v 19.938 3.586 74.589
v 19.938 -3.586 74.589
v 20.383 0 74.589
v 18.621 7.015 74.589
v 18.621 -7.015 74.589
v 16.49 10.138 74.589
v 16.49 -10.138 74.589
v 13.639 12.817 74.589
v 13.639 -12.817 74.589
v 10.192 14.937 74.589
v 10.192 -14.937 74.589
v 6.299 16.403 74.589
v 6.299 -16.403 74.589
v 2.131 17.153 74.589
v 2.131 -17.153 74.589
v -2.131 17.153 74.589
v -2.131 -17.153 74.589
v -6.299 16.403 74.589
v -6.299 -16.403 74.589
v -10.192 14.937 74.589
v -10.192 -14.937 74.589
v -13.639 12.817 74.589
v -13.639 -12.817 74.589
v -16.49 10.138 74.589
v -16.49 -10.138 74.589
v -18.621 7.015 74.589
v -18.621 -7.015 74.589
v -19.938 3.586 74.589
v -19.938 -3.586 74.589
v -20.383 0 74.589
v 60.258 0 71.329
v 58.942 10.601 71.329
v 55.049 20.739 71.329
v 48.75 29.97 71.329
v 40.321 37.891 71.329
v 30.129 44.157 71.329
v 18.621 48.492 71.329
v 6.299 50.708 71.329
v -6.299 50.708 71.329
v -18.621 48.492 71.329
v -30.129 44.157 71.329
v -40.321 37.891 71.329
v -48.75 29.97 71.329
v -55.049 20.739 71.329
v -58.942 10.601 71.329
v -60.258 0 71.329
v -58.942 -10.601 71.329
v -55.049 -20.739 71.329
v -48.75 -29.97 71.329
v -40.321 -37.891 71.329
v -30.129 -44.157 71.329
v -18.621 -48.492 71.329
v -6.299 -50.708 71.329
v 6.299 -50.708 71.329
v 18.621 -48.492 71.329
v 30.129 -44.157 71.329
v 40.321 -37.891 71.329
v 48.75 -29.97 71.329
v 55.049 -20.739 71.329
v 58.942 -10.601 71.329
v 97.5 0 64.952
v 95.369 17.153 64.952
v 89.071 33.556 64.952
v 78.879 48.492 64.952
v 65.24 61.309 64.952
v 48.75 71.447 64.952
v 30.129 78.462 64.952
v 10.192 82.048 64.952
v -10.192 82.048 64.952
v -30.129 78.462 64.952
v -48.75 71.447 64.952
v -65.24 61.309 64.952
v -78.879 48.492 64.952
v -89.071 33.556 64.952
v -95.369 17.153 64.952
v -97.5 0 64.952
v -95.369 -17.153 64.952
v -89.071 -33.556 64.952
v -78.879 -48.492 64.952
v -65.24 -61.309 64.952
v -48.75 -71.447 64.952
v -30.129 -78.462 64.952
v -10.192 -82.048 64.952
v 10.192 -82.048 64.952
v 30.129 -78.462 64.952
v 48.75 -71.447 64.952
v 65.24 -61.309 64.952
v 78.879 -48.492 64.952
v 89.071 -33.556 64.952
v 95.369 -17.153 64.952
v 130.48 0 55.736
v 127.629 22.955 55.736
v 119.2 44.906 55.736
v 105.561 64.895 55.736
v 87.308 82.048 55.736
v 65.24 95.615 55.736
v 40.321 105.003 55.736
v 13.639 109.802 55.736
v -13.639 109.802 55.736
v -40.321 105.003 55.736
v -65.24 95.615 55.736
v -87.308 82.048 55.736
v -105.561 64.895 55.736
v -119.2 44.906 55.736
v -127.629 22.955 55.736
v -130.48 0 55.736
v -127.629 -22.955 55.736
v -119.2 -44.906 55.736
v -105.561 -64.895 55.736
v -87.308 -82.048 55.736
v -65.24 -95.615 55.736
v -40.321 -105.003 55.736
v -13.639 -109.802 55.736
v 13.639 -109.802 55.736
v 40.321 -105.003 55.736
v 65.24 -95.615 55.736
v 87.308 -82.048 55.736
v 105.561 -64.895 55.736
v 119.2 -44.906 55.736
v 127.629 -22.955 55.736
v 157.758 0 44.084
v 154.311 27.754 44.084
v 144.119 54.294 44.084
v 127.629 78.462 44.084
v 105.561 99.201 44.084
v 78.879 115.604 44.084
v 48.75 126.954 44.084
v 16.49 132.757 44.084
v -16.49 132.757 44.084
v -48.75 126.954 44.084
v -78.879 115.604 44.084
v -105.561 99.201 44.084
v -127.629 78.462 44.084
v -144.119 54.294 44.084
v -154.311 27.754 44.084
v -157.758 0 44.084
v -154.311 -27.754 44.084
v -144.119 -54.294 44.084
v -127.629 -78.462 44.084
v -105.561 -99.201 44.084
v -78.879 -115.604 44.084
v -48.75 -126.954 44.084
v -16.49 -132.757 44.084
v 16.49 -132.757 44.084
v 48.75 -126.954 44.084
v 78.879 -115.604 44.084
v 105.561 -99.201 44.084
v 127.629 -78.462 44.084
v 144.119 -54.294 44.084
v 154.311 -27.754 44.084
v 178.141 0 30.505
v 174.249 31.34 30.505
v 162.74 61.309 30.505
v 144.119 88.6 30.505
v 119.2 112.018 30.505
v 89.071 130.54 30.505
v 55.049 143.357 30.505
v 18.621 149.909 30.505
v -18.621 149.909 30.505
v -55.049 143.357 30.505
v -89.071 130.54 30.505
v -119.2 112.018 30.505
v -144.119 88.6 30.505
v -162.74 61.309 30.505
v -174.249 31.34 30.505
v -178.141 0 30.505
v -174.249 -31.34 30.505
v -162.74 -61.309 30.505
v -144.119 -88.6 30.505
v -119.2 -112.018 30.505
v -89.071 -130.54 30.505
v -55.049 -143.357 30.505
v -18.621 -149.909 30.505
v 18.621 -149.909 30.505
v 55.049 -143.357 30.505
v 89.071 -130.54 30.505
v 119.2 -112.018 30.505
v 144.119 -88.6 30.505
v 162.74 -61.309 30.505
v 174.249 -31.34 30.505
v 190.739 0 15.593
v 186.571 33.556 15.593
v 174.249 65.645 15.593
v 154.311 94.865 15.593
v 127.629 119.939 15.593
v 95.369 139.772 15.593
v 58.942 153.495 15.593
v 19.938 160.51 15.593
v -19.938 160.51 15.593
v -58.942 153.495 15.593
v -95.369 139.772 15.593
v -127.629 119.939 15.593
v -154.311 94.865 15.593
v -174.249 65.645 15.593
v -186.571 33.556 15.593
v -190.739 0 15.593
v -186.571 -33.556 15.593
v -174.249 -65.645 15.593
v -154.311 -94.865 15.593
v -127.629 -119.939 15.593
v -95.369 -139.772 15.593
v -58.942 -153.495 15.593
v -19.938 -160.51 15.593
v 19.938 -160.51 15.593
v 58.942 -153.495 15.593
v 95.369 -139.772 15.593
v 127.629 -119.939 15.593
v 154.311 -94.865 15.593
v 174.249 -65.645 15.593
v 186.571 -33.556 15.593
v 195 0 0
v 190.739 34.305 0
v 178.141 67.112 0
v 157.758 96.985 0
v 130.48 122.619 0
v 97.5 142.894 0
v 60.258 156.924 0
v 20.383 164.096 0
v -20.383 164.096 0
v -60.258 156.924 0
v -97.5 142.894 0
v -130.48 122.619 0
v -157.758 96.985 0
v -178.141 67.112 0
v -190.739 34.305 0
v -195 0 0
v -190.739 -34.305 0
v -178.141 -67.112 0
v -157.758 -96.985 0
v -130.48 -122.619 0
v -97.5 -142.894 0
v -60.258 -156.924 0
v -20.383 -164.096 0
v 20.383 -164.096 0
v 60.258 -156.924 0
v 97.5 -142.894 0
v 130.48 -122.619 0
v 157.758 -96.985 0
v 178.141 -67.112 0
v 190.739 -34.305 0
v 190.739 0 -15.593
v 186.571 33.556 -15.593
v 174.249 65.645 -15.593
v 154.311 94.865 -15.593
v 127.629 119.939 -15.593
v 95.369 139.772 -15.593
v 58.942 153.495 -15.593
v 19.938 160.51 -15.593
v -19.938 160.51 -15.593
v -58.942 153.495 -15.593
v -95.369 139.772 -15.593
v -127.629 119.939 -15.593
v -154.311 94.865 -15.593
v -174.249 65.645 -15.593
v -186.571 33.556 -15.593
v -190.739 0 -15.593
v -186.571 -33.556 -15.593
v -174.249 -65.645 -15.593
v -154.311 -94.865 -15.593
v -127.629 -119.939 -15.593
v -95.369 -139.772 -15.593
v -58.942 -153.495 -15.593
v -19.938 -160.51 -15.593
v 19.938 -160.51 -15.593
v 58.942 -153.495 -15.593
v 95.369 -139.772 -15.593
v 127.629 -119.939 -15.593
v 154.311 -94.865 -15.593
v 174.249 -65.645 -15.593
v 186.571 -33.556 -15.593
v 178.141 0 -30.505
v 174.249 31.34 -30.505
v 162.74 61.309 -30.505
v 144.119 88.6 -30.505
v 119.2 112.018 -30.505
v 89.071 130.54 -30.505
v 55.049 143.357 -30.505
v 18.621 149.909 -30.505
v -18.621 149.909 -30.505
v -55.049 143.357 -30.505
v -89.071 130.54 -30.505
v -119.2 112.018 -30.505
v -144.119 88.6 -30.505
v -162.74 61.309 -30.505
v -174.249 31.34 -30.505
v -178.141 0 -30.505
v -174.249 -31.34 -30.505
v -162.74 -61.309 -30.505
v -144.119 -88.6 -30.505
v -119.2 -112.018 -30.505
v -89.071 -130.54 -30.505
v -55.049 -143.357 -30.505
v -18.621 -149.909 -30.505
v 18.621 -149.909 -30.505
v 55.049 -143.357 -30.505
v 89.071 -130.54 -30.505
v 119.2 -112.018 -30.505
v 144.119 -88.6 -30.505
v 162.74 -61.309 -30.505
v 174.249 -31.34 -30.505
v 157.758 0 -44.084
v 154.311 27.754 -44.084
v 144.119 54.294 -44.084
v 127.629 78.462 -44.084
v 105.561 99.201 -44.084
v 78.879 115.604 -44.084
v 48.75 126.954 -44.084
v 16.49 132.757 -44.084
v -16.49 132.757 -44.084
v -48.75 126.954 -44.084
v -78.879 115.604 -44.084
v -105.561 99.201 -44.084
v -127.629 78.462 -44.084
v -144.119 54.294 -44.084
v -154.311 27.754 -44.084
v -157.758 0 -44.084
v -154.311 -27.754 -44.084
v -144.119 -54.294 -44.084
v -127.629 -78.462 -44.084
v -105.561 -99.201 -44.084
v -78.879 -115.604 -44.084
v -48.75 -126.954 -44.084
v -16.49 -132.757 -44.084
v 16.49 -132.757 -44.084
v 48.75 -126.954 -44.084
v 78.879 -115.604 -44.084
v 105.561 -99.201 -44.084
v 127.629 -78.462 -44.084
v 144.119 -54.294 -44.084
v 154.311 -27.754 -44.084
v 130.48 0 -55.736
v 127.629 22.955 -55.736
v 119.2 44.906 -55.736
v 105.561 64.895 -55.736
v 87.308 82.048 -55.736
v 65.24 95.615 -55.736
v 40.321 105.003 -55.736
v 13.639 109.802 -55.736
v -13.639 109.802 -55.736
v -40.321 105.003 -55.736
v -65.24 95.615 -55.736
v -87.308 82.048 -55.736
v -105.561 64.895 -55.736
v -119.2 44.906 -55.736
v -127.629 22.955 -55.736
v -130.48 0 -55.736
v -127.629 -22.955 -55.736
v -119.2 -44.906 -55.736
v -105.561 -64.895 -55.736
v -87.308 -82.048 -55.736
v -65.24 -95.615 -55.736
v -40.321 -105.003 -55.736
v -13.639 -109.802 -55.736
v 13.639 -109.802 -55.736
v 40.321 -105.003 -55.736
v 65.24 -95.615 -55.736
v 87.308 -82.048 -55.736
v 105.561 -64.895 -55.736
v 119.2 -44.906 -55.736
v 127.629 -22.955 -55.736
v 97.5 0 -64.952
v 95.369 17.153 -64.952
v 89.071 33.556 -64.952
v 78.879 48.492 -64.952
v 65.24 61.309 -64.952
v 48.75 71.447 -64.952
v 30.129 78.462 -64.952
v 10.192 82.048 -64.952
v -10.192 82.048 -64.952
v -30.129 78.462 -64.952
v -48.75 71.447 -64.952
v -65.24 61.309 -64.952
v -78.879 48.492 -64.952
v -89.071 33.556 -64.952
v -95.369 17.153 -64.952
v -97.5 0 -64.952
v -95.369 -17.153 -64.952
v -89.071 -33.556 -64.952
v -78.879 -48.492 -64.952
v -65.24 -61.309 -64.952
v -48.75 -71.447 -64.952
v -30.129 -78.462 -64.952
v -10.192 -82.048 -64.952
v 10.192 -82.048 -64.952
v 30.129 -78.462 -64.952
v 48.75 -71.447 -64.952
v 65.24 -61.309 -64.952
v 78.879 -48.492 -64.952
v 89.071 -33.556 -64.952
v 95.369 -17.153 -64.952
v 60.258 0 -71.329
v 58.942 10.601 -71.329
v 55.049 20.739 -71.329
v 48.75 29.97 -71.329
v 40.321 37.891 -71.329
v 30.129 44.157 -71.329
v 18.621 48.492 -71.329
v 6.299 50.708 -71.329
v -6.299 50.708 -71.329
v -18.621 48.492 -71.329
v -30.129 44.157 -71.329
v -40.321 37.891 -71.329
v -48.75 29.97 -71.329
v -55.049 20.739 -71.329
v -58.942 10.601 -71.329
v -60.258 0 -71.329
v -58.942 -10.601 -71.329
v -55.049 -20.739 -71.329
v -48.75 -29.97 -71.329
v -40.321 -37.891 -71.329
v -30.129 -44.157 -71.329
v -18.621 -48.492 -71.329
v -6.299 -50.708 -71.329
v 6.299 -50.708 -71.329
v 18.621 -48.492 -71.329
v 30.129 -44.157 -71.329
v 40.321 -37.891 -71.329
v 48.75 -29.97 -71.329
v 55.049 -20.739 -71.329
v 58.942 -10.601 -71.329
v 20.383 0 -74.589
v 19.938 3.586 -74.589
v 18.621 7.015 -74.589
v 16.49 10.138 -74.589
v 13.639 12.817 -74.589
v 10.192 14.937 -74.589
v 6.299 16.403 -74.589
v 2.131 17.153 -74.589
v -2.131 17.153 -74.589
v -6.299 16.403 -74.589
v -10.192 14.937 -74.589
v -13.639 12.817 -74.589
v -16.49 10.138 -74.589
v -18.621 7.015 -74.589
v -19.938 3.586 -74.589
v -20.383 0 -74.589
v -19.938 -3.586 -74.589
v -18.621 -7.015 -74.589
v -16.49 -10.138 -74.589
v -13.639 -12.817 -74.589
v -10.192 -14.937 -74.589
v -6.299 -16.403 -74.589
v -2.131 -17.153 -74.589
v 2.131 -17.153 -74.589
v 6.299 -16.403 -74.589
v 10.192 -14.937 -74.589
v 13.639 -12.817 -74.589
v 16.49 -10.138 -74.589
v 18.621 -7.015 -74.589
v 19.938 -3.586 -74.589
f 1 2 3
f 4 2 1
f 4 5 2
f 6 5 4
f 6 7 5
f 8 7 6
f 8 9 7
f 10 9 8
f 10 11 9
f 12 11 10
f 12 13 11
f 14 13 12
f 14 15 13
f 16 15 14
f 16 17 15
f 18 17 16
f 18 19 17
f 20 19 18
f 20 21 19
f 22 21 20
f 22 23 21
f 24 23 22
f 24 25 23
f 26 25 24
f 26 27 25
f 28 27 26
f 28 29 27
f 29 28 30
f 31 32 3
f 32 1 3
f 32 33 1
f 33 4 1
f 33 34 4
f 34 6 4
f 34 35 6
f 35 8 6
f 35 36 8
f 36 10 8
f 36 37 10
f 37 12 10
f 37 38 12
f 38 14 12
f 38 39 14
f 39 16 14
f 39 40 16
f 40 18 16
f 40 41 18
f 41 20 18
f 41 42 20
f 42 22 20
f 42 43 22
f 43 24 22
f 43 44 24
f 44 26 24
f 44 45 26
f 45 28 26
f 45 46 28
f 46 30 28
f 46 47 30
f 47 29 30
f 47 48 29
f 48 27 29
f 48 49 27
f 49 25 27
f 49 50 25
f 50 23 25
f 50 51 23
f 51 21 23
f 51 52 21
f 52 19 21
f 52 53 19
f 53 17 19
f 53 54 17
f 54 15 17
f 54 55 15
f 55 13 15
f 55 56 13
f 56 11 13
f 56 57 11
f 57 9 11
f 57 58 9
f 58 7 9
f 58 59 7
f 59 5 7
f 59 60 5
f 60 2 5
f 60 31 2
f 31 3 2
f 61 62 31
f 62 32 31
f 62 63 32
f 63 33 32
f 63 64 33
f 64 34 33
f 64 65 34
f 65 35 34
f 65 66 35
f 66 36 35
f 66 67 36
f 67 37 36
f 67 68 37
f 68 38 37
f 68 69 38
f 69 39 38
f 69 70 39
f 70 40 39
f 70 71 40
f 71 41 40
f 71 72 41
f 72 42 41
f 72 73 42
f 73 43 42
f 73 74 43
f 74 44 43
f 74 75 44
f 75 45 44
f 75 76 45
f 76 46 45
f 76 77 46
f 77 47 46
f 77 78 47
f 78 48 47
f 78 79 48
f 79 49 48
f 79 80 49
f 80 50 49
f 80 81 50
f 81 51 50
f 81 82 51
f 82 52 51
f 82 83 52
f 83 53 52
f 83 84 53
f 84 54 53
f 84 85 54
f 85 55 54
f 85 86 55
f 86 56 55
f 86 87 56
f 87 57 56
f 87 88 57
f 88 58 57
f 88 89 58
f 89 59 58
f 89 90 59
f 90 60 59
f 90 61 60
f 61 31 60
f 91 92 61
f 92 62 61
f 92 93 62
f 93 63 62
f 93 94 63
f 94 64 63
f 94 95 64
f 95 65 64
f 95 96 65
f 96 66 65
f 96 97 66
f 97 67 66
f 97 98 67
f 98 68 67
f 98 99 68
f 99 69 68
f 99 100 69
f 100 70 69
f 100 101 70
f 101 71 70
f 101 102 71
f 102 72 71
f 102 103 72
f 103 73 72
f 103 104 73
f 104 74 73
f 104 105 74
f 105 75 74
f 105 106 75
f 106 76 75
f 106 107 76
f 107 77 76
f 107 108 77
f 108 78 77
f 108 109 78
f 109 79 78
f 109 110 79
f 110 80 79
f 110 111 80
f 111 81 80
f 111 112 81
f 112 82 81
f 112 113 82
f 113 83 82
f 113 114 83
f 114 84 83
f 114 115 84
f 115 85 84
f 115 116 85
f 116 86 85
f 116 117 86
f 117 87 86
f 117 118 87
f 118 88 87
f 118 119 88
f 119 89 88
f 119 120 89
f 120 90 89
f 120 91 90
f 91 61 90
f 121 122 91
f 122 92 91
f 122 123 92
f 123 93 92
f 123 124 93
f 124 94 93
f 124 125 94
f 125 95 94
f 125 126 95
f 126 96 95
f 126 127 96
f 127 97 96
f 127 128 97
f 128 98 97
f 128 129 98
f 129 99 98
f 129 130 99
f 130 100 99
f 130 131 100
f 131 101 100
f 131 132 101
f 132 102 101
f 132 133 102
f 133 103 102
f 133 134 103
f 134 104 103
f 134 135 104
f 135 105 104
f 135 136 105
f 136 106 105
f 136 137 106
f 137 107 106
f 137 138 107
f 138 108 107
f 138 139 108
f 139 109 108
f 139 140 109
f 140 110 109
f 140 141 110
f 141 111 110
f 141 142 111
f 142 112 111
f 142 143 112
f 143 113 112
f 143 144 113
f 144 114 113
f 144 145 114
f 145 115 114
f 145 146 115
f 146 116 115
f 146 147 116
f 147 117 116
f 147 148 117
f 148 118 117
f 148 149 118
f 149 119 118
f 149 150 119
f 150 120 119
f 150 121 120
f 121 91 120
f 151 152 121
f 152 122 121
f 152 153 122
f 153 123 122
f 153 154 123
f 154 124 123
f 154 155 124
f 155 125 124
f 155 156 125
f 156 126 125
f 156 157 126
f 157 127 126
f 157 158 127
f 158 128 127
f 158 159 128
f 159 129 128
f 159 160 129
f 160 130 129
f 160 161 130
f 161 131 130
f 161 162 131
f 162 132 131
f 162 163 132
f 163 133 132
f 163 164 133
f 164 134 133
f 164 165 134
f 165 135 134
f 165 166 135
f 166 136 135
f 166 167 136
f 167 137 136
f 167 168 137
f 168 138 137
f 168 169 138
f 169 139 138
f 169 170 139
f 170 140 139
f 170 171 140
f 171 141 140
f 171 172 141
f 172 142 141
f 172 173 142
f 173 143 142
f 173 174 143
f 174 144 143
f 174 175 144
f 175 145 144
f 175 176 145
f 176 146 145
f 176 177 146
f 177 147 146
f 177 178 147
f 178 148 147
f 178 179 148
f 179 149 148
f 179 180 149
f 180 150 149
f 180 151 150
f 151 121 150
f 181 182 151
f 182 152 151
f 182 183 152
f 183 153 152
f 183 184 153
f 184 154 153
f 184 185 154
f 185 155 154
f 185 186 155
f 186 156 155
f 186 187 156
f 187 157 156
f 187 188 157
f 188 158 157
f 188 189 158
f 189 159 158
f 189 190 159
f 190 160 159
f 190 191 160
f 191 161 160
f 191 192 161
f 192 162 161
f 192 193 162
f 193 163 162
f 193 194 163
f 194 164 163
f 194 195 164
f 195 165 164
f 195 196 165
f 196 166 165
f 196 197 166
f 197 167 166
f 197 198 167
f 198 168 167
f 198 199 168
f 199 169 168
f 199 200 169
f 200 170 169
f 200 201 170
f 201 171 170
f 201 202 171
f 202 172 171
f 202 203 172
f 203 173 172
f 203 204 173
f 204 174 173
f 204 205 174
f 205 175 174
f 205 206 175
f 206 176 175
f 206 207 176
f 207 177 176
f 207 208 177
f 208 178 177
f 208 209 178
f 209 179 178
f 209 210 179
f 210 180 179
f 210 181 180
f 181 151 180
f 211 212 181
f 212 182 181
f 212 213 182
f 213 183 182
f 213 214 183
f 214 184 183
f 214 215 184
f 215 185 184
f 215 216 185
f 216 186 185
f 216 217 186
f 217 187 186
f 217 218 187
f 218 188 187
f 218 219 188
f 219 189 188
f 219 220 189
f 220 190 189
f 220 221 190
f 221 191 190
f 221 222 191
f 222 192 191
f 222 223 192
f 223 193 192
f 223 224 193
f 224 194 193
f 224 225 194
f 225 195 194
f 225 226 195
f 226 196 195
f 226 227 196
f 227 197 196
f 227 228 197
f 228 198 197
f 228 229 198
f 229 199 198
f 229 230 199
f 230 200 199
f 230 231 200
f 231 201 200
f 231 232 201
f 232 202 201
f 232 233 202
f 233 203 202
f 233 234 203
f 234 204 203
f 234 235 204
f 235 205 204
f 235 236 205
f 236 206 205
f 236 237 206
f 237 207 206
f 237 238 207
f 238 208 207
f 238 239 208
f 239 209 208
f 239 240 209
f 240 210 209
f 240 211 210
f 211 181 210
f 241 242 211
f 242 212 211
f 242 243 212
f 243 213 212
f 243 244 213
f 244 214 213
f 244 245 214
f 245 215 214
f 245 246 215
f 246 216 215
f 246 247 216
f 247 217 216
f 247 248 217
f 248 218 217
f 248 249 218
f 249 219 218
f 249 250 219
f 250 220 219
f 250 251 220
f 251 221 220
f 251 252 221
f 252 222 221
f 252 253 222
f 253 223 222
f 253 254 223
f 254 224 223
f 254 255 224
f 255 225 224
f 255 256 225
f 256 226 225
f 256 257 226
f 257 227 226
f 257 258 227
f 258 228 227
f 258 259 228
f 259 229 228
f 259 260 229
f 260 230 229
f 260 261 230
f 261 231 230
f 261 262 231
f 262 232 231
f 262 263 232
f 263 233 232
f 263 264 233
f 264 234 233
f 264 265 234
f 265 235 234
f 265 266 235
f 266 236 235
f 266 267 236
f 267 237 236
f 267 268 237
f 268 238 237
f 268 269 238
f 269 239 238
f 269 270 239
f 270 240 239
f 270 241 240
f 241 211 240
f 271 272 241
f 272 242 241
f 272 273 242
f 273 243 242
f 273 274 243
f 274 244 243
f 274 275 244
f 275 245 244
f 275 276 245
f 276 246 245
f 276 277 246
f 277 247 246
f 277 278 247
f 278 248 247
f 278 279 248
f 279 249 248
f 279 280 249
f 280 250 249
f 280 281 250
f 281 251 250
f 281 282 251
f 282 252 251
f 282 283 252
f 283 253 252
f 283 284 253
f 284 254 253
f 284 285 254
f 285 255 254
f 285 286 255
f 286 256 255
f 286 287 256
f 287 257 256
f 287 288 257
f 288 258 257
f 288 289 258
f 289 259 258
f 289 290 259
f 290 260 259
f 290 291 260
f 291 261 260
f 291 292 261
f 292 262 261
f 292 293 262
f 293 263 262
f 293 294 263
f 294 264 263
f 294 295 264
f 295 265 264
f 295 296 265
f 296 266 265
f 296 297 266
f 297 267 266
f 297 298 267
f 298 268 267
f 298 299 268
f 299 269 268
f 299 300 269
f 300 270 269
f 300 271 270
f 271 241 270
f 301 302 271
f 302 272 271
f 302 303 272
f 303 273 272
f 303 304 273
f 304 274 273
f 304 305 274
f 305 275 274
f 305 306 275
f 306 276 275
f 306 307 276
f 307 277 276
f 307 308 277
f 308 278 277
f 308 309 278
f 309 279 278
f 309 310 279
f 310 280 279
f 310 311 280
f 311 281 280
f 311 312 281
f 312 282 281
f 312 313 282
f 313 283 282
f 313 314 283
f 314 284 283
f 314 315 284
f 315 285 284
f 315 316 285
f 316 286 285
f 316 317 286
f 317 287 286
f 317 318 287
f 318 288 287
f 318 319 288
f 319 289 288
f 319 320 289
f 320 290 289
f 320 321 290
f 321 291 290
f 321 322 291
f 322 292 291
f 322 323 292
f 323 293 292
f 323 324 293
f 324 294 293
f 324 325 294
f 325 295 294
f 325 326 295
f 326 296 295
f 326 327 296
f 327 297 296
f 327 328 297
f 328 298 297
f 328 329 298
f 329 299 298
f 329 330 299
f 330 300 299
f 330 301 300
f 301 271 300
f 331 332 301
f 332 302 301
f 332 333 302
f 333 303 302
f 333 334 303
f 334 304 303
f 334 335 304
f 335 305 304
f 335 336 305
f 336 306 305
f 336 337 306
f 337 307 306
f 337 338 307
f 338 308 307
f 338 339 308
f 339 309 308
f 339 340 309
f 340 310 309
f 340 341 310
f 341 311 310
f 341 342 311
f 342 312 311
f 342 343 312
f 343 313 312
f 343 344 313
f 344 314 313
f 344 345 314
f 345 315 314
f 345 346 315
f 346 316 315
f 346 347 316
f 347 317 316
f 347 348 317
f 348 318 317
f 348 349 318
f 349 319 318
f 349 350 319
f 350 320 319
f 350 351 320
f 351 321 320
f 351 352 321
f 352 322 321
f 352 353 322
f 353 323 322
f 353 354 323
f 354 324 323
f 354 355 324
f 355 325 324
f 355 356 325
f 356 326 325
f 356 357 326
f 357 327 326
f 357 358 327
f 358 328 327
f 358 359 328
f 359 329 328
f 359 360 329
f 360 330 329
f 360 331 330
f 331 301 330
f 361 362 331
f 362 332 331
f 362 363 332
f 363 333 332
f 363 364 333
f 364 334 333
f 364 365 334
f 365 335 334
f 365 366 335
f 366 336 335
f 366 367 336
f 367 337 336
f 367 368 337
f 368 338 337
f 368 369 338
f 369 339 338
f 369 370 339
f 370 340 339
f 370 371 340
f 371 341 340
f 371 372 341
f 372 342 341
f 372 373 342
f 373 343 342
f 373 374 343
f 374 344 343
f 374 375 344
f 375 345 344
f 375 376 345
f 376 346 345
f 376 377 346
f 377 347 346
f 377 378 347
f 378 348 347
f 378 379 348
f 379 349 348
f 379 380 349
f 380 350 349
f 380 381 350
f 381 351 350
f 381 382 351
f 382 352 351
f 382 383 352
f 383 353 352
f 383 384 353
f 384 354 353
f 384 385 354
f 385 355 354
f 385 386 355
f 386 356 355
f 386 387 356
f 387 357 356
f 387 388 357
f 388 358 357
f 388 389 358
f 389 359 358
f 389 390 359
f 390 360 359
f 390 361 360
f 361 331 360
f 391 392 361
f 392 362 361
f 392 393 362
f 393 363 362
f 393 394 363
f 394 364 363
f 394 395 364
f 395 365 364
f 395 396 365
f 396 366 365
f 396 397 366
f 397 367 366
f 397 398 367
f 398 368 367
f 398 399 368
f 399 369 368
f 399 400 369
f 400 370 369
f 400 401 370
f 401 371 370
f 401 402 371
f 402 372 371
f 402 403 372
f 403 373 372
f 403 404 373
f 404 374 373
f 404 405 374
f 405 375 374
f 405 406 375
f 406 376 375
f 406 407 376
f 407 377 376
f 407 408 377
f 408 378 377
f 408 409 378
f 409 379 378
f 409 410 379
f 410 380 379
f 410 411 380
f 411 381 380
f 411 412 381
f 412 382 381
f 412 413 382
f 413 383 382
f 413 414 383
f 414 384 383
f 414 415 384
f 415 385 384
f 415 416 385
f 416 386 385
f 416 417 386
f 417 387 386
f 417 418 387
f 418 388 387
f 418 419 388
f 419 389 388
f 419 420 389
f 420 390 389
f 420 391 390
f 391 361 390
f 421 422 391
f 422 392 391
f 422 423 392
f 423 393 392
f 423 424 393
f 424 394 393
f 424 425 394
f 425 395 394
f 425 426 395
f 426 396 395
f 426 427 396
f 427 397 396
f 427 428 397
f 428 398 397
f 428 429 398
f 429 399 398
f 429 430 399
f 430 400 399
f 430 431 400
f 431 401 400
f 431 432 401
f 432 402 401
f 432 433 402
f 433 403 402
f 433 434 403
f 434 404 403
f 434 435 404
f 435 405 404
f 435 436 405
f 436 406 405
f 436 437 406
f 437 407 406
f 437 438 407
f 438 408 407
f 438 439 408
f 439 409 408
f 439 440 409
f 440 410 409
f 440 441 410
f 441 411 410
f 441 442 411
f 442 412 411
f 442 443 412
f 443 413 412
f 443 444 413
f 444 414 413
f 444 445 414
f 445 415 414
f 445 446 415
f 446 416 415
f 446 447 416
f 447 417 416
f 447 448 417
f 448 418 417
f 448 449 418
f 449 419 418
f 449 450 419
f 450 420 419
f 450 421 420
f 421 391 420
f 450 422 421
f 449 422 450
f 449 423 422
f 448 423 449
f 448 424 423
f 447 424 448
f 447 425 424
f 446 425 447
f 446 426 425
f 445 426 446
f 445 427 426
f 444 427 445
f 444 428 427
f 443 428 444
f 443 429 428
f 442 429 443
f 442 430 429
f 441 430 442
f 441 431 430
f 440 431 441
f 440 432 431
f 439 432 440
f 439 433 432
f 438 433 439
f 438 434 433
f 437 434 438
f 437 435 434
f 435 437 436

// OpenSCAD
// Generated by SolidPython 1.0.1 on 2020-07-29 00:46:50


scale(v = [13, 11, 5]) {
	sphere(r = 15);
}
/***********************************************
*********      SolidPython code:      **********
************************************************
 
# import packages: SolidPython
from solid import *
from solid.utils import *
from itertools import chain, combinations, permutations


class Resize:

    def __init__(self, scad_file):
        self.scad_file = scad_file
        #self.scad_file = import_scad(scad_file)
        # cone/cylinder param:
        self.r1 = 0
        self.r2 = 0
        self.h = 0
        # rectangular prism param:
        self.w = 0
        self.l = 0
        # ellipse param:
        self.r = 0

    # import OpenScad code (file name corresponds to shape)


    # classify shape + parameters
    def assign(self, param1, param2, param3):
        if self.scad_file == 'cone.scad':
            self.r1 = param1
            self.r2 = param2
            self.h = param3
        elif self.scad_file == 'cylinder.scad':
            self.r1 = param1
            self.r2 = param2
            self.h = param3
        elif self.scad_file == 'rectangularPrism.scad':
            self.h = param1
            self.l = param2
            self.w = param3
        else:
            self.r = param1
            self.h = param2

    # resize parameters
    def iterate(self):
        x = range(3, 20, 2)
        i = 1
        if self.scad_file == 'cone.scad':
            tempList = list(permutations(x, 2))
            for temp in tempList:
                param1 = temp[0]
                param2 = temp[1]
                filepath = 'produced_scad_files/' + 'cone' + str(param1) + '_' + str(param2) + '_' + '.scad'
                scad_render_to_file(cylinder(h=param1, r1=param2, r2=0), filepath)

        elif self.scad_file == 'cylinder.scad':
            tempList = list(permutations(x, 3))
            for temp in tempList:
                param1 = temp[0]
                param2 = temp[1]
                filepath = 'produced_scad_files/' + 'cylinder' + str(param1) + '_' + str(param2) + '_' + '.scad'
                scad_render_to_file(cylinder(h=param1, r1=param2, r2=param2), filepath)

        elif self.scad_file == 'rectangularPrism.scad':
            tempList = list(permutations(x, 3))
            for temp in tempList:
                param1 = temp[0]
                param2 = temp[1]
                param3 = temp[2]
                filepath = 'produced_scad_files/' + 'rectangularPrism' + str(param1) + '_' + str(param2) + '_' + str(
                    param3) + '.scad'
                scad_render_to_file(cube(size=(param1, param2, param3)), filepath)

        elif self.scad_file == 'ellipse.scad':
            tempList = list(permutations(x, 4))
            for temp in tempList:
                param1 = temp[0]
                param2 = temp[1]
                param3 = temp[2]
                param4 = temp[3]
                filepath = 'produced_scad_files/' + 'ellipse' + str(param1) + '_' + str(param2) + '_' + str(param3) + '_' + str(param4) + '.scad'
                scad_render_to_file(scale([param1, param2, param3])(sphere(r=param4)), filepath)

    def render_to_scadfile(self):
        scad_render_to_file(scad, 'example.scad') 
 
************************************************/
